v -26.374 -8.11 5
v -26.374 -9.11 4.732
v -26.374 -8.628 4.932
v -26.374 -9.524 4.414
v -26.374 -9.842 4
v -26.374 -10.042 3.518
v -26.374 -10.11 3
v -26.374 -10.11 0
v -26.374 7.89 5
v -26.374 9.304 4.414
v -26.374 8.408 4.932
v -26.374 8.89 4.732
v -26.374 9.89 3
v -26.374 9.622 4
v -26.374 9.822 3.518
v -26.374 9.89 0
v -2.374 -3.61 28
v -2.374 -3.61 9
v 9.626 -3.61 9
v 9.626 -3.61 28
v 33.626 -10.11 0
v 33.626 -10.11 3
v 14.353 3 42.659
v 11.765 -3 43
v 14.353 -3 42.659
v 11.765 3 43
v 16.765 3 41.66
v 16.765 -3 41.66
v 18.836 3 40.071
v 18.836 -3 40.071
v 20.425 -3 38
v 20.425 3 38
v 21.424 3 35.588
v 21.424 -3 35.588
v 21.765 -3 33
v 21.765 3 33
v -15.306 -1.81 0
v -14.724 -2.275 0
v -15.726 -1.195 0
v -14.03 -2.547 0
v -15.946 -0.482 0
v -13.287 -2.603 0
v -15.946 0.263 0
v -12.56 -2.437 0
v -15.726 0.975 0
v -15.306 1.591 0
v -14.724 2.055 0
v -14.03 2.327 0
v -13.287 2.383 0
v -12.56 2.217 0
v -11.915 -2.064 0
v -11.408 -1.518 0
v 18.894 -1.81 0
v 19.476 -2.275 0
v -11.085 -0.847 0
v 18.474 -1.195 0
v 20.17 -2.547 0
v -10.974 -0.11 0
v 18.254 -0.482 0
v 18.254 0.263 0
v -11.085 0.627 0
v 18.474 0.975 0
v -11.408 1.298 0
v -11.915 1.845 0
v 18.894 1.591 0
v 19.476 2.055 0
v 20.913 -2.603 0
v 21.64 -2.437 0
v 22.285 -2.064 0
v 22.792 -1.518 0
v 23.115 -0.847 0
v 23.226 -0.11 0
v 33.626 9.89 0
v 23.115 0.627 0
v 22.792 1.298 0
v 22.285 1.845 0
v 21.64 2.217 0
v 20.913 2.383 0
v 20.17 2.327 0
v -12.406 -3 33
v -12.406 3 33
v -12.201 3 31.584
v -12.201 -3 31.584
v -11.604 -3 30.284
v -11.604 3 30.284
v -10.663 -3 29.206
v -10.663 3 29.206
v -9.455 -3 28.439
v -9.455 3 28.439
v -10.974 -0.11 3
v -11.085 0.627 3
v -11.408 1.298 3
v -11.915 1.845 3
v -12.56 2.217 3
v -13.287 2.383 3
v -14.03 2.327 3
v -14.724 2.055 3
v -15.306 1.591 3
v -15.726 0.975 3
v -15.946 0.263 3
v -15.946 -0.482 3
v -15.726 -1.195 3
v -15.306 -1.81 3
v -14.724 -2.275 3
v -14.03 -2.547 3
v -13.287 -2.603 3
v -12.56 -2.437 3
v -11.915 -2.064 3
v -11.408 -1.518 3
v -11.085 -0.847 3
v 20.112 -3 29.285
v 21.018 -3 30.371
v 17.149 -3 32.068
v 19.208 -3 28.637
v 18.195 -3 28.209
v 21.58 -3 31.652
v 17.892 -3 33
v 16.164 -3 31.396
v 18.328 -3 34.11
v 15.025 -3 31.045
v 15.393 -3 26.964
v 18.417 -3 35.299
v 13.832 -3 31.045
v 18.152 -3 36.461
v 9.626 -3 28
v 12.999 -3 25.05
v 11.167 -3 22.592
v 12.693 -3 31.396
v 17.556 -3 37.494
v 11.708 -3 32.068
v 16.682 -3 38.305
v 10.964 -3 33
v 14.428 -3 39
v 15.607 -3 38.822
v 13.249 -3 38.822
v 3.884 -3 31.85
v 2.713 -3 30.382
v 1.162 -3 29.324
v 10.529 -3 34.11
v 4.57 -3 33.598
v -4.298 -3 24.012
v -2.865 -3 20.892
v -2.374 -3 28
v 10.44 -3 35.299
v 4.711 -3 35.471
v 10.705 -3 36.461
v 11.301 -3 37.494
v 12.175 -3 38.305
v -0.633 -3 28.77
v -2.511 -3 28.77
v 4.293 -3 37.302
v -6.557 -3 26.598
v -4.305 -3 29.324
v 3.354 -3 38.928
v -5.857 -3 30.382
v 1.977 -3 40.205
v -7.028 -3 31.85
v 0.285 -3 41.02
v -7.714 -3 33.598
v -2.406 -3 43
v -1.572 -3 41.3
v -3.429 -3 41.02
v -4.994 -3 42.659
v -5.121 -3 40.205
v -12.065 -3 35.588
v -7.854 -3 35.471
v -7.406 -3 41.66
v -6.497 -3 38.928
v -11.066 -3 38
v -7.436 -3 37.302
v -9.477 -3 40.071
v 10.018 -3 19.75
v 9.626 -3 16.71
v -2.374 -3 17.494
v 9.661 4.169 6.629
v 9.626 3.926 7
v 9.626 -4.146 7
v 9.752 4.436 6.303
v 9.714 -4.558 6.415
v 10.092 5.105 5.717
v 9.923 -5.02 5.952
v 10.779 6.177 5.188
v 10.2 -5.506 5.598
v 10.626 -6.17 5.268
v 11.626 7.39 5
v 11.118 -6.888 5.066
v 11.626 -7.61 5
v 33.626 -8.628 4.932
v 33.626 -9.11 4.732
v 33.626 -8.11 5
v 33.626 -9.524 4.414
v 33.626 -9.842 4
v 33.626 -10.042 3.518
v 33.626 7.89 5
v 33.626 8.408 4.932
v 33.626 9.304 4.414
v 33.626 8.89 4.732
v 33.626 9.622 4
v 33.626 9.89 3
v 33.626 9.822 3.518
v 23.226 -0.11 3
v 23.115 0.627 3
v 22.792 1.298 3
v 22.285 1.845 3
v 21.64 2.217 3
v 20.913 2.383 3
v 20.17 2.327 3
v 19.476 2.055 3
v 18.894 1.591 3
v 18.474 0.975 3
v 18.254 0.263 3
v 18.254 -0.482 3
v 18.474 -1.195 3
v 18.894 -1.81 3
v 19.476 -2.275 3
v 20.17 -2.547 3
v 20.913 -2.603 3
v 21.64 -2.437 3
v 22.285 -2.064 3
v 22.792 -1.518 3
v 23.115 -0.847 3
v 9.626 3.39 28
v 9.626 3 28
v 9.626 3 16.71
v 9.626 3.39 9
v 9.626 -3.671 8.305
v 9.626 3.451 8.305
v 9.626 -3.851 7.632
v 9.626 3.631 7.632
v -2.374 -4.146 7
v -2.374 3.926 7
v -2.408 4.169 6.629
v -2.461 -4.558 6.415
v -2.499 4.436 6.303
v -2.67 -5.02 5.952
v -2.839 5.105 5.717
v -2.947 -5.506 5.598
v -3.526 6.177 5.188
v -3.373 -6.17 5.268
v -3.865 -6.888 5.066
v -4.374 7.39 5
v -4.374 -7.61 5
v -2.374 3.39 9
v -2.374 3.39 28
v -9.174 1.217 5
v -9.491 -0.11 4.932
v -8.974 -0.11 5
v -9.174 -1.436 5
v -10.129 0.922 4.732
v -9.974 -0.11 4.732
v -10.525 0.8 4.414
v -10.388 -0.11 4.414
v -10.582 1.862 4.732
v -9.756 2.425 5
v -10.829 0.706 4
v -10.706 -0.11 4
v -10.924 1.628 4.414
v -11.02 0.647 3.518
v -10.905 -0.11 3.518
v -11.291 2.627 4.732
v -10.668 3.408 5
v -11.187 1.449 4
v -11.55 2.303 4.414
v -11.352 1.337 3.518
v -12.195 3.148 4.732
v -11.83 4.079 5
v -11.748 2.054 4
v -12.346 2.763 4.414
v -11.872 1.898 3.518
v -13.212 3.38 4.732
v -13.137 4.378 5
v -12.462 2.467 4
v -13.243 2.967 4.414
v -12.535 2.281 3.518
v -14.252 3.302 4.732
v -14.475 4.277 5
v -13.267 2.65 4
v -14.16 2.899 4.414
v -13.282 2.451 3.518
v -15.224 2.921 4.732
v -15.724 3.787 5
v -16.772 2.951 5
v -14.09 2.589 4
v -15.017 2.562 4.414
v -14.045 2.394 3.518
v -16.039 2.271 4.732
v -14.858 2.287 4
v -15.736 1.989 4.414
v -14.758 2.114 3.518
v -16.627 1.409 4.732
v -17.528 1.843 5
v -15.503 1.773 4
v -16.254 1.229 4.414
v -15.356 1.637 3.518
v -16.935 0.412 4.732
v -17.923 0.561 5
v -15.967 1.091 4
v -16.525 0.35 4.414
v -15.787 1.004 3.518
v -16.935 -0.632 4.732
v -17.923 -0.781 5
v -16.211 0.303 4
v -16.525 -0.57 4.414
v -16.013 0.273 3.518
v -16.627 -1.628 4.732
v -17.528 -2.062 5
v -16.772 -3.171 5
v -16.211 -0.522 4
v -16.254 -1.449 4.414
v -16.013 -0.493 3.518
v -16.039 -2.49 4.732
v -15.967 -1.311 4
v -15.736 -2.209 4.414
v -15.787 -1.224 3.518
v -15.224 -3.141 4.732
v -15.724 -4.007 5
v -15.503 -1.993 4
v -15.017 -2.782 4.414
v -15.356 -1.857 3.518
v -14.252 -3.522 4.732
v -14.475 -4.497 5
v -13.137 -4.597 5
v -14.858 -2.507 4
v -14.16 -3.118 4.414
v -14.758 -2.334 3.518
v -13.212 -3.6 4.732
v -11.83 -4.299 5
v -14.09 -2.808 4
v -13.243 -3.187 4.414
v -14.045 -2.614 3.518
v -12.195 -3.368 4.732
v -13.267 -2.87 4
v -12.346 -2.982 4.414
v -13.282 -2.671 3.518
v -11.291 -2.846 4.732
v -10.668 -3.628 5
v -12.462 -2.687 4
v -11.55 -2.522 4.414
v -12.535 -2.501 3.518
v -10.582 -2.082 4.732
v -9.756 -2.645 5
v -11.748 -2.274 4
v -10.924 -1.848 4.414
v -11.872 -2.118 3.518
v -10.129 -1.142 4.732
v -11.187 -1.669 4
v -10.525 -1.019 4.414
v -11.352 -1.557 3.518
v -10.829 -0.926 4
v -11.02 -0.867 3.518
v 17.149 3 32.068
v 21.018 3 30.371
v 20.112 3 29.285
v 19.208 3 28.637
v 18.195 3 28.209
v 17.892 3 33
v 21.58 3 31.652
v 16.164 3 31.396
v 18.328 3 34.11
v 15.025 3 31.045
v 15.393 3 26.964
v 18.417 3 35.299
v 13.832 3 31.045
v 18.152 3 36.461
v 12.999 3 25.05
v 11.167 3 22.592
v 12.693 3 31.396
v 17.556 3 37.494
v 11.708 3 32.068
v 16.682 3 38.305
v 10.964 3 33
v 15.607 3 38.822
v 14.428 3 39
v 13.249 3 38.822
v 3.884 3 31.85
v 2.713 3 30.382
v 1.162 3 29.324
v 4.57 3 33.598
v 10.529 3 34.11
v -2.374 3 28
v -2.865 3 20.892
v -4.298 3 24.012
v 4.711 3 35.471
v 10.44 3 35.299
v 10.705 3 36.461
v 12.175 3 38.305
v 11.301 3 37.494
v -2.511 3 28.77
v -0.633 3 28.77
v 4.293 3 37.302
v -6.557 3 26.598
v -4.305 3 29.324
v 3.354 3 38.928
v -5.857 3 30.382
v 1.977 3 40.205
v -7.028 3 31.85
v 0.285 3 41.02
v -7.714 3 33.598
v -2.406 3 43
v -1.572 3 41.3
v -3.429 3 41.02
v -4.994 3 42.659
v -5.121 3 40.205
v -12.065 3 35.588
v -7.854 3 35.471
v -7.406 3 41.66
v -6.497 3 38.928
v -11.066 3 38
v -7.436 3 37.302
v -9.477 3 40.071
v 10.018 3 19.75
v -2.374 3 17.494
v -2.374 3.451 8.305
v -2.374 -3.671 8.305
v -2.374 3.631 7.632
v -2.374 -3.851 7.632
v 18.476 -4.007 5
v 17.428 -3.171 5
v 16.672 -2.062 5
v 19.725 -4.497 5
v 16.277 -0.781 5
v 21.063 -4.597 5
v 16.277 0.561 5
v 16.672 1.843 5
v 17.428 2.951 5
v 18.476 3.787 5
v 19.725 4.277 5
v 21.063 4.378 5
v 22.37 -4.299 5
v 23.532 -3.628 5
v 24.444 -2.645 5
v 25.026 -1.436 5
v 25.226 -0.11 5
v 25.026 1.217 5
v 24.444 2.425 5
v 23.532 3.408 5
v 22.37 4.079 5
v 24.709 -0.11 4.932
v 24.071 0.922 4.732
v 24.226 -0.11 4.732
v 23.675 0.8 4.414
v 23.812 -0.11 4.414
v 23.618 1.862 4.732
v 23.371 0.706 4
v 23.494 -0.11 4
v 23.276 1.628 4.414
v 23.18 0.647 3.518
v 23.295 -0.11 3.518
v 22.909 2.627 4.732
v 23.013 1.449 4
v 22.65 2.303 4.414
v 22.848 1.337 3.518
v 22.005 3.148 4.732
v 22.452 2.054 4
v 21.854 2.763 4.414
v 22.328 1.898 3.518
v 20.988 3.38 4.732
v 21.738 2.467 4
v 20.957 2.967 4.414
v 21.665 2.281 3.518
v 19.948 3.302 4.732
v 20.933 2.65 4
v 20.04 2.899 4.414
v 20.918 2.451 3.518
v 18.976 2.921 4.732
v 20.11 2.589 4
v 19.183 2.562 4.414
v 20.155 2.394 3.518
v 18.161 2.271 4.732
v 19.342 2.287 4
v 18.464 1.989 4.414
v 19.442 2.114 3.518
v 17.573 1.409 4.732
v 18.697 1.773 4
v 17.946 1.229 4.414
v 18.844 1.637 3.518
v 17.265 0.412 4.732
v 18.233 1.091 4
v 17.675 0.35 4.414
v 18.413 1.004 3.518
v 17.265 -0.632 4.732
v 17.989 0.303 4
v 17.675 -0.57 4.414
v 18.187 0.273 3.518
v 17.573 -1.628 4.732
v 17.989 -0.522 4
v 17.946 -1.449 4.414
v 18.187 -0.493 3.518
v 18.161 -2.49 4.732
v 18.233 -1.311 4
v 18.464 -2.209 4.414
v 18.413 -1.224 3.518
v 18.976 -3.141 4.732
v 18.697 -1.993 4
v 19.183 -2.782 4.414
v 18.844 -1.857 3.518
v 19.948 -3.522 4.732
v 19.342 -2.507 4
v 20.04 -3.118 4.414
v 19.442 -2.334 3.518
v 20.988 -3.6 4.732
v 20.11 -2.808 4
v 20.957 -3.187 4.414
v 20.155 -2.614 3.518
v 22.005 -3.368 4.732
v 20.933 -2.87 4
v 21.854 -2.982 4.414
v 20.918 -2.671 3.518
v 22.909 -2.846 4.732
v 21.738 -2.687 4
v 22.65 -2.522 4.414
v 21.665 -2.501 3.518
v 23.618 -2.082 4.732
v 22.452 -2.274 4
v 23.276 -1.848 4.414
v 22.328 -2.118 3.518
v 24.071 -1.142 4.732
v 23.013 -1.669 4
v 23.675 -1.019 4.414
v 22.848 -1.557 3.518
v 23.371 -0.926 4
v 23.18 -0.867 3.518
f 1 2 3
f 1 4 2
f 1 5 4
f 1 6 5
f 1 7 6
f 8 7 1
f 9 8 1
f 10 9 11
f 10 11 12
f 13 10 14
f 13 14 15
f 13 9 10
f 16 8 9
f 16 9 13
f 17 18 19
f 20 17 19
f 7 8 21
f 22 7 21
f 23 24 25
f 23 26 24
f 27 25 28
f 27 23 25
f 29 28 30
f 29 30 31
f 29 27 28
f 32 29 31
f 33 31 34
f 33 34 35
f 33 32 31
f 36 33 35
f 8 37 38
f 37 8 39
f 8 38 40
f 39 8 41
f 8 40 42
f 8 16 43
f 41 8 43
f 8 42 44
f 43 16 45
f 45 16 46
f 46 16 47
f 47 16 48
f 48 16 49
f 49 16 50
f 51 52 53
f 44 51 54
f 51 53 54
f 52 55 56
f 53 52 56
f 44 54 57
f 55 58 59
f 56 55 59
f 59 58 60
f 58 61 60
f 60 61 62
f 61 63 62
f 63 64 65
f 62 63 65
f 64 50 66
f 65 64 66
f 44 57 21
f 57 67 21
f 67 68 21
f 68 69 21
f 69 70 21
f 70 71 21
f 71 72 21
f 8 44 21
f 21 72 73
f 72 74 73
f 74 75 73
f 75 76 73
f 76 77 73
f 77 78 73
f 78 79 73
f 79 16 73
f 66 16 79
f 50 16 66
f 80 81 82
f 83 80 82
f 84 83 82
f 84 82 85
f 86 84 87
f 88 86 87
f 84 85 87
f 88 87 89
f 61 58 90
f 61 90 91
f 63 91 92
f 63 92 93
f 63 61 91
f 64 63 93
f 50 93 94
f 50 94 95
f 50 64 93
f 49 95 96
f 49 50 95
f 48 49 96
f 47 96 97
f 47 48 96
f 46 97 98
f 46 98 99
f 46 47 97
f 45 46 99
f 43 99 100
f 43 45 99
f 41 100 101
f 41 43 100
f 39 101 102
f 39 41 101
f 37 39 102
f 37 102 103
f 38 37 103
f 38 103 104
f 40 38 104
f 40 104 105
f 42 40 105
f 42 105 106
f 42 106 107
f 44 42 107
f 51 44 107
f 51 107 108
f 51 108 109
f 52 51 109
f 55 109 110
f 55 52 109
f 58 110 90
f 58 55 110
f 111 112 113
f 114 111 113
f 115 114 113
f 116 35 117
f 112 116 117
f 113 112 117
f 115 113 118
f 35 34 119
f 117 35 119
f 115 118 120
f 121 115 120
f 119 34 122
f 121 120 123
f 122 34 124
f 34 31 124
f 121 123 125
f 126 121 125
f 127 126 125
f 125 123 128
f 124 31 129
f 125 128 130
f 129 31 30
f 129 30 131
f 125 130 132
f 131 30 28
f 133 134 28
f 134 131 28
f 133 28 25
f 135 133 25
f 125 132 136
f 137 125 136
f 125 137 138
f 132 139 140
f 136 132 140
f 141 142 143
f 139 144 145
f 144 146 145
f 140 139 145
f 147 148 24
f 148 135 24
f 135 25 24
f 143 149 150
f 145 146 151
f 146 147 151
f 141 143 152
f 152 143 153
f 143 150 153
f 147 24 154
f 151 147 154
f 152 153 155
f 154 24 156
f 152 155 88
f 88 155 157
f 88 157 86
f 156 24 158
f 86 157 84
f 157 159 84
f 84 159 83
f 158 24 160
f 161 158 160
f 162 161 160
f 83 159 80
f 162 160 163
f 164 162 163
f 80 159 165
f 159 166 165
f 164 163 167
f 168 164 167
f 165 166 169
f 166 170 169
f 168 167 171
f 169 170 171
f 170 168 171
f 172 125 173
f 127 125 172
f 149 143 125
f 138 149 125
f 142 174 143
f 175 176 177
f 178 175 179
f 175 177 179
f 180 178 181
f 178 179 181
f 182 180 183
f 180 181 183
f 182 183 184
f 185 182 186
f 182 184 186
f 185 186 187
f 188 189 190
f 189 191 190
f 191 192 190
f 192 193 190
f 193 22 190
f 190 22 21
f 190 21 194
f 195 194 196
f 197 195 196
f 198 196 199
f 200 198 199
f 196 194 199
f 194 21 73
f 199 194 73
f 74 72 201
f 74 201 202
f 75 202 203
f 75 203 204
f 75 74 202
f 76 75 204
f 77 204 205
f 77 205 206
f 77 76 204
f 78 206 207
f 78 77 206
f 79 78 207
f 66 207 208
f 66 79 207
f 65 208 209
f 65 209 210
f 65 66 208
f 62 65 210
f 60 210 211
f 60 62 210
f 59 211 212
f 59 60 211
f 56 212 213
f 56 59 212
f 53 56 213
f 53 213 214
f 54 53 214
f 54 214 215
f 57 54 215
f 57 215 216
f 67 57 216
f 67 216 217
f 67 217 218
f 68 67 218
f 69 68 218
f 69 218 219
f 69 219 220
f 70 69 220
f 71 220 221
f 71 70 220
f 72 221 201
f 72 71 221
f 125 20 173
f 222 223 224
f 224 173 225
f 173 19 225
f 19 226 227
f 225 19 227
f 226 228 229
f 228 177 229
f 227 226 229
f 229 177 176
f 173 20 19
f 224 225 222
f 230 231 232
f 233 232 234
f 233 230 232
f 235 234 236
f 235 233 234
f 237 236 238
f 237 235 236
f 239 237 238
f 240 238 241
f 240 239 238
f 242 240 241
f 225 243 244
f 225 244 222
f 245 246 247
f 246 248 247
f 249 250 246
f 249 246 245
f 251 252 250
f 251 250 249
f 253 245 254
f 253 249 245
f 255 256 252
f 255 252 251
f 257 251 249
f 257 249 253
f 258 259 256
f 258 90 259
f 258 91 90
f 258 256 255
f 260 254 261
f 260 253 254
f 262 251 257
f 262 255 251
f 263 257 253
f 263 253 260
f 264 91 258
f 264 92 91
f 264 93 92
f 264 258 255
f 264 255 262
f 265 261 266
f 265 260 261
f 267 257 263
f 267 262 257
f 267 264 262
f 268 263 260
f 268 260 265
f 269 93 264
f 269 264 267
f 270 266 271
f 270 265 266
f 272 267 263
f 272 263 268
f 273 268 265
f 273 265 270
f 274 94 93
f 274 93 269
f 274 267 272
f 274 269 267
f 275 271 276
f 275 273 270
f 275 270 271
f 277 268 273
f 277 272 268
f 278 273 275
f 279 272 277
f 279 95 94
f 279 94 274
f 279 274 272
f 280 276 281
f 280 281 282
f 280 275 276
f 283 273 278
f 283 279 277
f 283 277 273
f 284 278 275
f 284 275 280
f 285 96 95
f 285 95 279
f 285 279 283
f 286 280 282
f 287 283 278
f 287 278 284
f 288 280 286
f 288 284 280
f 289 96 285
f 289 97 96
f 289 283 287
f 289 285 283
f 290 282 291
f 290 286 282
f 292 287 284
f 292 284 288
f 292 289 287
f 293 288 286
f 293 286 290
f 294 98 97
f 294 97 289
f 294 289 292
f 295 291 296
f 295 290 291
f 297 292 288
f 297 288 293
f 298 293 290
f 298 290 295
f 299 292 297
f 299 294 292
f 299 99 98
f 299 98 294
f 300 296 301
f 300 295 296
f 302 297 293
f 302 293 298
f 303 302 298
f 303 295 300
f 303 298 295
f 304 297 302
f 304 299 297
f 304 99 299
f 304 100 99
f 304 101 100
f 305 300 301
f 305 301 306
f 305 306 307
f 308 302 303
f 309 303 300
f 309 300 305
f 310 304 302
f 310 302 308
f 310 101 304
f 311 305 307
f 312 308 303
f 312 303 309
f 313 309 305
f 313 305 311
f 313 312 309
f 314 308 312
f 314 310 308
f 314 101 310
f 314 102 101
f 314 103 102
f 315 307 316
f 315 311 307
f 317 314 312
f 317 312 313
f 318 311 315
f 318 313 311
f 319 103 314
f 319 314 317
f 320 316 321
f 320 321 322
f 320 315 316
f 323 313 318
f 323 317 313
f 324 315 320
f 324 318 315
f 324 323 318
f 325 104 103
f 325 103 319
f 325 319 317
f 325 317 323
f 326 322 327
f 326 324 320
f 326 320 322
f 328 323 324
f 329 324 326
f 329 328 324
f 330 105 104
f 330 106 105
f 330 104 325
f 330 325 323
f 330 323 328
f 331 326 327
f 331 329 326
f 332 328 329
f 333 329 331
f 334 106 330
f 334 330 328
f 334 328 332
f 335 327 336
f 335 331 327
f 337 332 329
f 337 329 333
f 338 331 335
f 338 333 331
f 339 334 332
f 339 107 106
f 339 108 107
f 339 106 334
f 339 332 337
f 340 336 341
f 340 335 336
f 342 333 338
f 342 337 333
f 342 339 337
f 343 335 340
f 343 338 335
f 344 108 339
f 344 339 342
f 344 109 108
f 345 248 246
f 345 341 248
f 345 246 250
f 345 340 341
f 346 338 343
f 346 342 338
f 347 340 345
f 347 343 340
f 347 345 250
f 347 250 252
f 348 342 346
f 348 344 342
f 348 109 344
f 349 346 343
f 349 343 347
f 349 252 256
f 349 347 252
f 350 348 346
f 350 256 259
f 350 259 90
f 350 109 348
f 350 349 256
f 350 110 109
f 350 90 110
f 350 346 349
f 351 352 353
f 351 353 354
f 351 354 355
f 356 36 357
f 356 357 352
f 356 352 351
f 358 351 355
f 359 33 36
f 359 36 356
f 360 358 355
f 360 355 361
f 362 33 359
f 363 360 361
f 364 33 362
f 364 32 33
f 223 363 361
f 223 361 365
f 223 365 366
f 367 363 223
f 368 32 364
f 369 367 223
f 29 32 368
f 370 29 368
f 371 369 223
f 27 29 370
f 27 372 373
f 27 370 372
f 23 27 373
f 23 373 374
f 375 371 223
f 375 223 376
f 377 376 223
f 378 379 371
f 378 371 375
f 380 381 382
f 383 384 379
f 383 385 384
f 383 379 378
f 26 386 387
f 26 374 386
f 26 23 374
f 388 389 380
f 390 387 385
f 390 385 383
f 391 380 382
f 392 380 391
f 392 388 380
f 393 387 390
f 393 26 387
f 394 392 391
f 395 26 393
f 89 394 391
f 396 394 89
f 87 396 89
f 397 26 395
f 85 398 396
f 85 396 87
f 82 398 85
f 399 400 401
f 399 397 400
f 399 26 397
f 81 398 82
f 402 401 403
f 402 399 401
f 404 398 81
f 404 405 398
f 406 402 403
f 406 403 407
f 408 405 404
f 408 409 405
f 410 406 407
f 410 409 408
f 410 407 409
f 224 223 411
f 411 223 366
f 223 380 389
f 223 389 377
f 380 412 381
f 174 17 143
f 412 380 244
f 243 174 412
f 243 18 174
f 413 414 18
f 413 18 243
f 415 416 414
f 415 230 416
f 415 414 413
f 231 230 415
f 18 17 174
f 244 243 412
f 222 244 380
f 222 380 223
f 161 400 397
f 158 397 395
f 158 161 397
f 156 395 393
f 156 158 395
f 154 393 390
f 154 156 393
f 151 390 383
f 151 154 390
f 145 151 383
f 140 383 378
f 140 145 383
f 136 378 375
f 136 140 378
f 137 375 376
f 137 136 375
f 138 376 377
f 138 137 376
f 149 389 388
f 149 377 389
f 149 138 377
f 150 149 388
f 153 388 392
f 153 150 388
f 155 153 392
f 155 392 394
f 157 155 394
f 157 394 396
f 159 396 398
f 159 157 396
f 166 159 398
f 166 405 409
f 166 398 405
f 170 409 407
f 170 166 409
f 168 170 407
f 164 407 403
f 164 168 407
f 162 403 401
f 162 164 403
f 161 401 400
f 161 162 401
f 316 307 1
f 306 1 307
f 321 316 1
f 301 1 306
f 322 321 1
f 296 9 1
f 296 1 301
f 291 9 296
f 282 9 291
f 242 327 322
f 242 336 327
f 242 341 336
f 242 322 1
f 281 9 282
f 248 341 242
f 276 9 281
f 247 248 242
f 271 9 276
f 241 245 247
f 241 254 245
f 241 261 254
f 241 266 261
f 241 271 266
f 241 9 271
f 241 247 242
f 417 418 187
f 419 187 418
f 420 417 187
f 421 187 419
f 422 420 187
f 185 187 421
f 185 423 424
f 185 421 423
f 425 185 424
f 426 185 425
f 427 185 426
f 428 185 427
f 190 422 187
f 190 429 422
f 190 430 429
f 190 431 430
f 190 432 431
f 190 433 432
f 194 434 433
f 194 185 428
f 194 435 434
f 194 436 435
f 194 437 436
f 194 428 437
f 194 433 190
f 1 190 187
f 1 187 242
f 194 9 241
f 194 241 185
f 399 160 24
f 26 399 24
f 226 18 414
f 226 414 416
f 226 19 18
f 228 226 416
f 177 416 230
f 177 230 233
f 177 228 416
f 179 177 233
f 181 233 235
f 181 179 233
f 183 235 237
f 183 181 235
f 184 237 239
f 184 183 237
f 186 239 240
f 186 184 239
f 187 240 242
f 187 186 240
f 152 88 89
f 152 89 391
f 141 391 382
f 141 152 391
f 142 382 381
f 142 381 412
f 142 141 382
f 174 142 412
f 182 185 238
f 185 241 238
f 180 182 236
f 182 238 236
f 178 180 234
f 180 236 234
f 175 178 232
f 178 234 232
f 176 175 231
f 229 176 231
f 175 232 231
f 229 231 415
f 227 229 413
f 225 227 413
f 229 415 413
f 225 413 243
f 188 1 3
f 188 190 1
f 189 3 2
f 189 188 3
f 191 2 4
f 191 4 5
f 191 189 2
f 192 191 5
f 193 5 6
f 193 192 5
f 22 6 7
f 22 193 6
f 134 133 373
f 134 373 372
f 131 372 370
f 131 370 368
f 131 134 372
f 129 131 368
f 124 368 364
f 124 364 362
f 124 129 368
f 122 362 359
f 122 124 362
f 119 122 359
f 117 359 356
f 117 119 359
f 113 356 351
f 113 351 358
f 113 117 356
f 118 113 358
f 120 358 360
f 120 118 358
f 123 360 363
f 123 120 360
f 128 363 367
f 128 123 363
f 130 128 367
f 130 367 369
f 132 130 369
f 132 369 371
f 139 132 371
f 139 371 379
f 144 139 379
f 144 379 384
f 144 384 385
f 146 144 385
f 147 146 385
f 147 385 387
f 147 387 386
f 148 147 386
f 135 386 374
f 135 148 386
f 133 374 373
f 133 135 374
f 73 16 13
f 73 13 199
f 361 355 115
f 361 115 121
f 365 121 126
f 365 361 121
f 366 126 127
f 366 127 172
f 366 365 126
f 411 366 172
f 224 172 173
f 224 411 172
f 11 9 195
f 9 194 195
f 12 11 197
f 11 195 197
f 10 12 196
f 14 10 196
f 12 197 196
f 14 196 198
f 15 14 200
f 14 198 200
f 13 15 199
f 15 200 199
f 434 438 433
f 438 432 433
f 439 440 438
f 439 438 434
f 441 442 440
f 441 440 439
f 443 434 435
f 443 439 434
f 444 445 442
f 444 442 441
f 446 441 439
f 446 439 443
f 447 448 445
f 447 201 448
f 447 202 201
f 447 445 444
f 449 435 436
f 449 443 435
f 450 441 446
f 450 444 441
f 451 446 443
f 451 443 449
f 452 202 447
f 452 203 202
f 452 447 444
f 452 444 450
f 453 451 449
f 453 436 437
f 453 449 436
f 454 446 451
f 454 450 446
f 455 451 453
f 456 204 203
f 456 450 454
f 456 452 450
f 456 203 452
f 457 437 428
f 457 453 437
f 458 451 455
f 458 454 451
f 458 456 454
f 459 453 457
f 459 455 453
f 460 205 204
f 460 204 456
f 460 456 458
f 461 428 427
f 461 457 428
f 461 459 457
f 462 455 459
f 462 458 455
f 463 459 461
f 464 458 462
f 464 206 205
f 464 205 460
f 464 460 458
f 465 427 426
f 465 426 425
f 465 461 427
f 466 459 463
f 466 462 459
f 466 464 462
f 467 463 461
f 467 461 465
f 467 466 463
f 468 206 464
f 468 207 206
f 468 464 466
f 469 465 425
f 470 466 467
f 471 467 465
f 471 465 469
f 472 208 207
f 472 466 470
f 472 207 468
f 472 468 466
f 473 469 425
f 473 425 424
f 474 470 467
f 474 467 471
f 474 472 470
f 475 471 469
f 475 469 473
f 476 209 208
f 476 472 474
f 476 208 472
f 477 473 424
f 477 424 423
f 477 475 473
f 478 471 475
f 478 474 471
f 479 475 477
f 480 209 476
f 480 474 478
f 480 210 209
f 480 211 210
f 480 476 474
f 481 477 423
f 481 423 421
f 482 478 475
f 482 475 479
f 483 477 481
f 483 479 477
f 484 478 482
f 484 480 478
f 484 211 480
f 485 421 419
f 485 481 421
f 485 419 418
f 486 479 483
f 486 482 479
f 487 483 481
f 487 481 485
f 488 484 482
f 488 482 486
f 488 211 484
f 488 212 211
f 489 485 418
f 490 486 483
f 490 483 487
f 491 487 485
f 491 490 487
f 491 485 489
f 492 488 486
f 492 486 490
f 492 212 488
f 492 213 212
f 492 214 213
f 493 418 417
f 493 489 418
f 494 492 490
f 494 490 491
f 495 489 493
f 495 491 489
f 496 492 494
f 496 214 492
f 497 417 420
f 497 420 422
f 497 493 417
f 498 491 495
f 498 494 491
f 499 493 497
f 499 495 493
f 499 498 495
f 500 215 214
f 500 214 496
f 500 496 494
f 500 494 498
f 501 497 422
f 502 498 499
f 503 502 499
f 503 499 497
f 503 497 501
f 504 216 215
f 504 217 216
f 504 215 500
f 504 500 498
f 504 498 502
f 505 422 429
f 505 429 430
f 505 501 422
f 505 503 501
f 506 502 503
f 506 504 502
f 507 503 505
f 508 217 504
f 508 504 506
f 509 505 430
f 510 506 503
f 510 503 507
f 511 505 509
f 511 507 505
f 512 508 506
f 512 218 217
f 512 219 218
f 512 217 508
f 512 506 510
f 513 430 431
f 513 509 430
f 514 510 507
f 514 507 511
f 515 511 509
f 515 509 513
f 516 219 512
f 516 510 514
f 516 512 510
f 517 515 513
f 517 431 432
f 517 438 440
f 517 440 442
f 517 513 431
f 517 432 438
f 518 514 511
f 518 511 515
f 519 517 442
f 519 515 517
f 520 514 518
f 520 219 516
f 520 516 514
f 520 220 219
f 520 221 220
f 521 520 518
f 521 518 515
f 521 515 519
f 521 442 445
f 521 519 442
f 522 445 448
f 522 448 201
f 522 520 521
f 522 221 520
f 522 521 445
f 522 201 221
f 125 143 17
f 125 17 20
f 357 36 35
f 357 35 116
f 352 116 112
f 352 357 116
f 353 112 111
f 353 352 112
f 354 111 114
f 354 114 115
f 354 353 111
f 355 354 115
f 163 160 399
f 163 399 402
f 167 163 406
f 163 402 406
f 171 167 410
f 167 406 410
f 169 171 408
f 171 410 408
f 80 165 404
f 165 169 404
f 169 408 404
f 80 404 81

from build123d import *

# Parameters (mm, degrees)
ESBO_O1_W                     = 60
ESBO_O1_H                     = 20
ESBO_O1_R                     = 2.5
RESSALTO_EXTRUS_O2_DEPTH      = 5
ESBO_O2_W                     = 12
ESBO_O2_H                     = 7
RESSALTO_EXTRUS_O3_DEPTH      = 28
RESSALTO_EXTRUS_O4_DEPTH      = 3
RESSALTO_EXTRUS_O4_DEPTH_BACK = 3
ESBO_O3_R                     = 4
ESBO_O3_R_2                   = 6.3
FILETE1_R                     = 10
FILETE2_R                     = 10
FILETE5_R                     = 5
FILETE7_R                     = 5
FILETE9_R                     = 2
FILETE10_R                    = 2
FILETE13_R                    = 12
FILETE14_R                    = 12
FILETE15_R                    = 4
FILETE16_R                    = 4
FILETE17_R                    = 2
FILETE18_R                    = 2
FILETE19_R                    = 2
FILETE20_R                    = 2


with BuildPart() as part:
    # Esboço1 → Ressalto-extrusão2 (new body)
    with BuildSketch(Plane.XY):
        with Locations((3.626373626, -0.10989011)):
            Rectangle(ESBO_O1_W, ESBO_O1_H)
        with Locations((-13.473626374, -0.10989011)):
            Circle(ESBO_O1_R, mode=Mode.SUBTRACT)
        with Locations((20.726373626, -0.10989011)):
            Circle(ESBO_O1_R, mode=Mode.SUBTRACT)
    extrude(amount=RESSALTO_EXTRUS_O2_DEPTH)

    # Esboço2 → Ressalto-extrusão3 (add)
    with BuildSketch(Plane.XY):
        with Locations((3.626373626, -0.10989011)):
            Rectangle(ESBO_O2_W, ESBO_O2_H)
    extrude(amount=RESSALTO_EXTRUS_O3_DEPTH)

    # Esboço3 → Ressalto-extrusão4 (add, two sides: drawn at the far end of the back side and taken through both)
    with BuildSketch(Plane(origin=(0, 0, 0), x_dir=(1, 0, 0), z_dir=(0, 1, 0)).offset(-RESSALTO_EXTRUS_O4_DEPTH_BACK)):
        Polygon((-21.373626374, -43), (28.626373626, -43), (20.428395134, -28), (-11.066061454, -28), align=None)
        with Locations(Location((14.428395134, -35, 0), (0, 0, 270))):
            Circle(ESBO_O3_R, mode=Mode.SUBTRACT)
        with Locations(Location((-1.571604866, -35, 0), (0, 0, 270))):
            Circle(ESBO_O3_R_2, mode=Mode.SUBTRACT)
    extrude(amount=RESSALTO_EXTRUS_O4_DEPTH + RESSALTO_EXTRUS_O4_DEPTH_BACK)

    # Filete1
    # the kernel refuses this fillet: 10 mm, written as the material it takes off along each edge
    with BuildSketch(Plane(origin=(-21.373626374, 50.419547395, 43), x_dir=(0.5663446817088761, 0, -0.8241684909653315), z_dir=(0, -1, 0))) as filete1_piece_1:
        with BuildLine():
            CenterArc((18.9840083, 9.96923191), FILETE1_R, 145.504279398, 120)
            Line((10.74232339, 15.632678727), (10.577489692, 15.745947664))
            Line((10.577489692, 15.745947664), (-0.164833698, 0.113268936))
            Line((-0.164833698, 0.113268936), (0, -0.2))
            ThreePointArc((0, -0.2), (9.100080969, -0.2), (18.184485011, -0.199384638))
            Line((18.184485011, -0.199384638), (18.200161938, 0))
        make_face()
    extrude(amount=100.839094789, mode=Mode.SUBTRACT)

    # Filete2
    filete2_edges = [part.edges().sort_by_distance(p)[0] for p in [
        (28.626373626, 0, 43),
    ]]
    fillet(filete2_edges, radius=FILETE2_R)

    # Filete5
    filete5_edges = [part.edges().sort_by_distance(p)[0] for p in [
        (20.428395134, 0, 28),
    ]]
    fillet(filete5_edges, radius=FILETE5_R)

    # Filete7
    filete7_edges = [part.edges().sort_by_distance(p)[0] for p in [
        (-11.066061454, 0, 28),
    ]]
    fillet(filete7_edges, radius=FILETE7_R)

    # Filete9
    filete9_edges = [part.edges().sort_by_distance(p)[0] for p in [
        (9.626373626, -0.10989011, 5),
    ]]
    fillet(filete9_edges, radius=FILETE9_R)

    # Filete10
    filete10_edges = [part.edges().sort_by_distance(p)[0] for p in [
        (-2.373626374, -0.10989011, 5),
    ]]
    fillet(filete10_edges, radius=FILETE10_R)

    # Filete13
    # the kernel refuses this fillet: 12 mm, written as the material it adds along each edge
    with BuildSketch(Plane(origin=(-2.373626374, -3, 28), x_dir=(0, 0, -1), z_dir=(0, 1, 0))) as filete13_piece_1_section:
        with BuildLine():
            CenterArc((10.506434115, 12), FILETE13_R, 204.196775666, 65.803224334)
            Line((-0.439284084, 7.081539559), (-1.533855904, 6.589693515))
            ThreePointArc((-1.533855904, 6.589693515), (-1.2, 5.032181042), (-1.2, 0))
            Line((-1.2, 0), (0, -1.2))
            Line((0, -1.2), (10.506434115, -1.2))
            Line((10.506434115, -1.2), (10.506434115, 0))
        make_face()
    filete13_piece_1 = extrude(amount=6, mode=Mode.PRIVATE)
    filete13_piece_1 = filete13_piece_1 - Plane(origin=(-1.571604866, 0, 35), x_dir=(0, 0, 1), z_dir=(0, -1, 0)) * Cylinder(6.3, 55, mode=Mode.PRIVATE)
    add(filete13_piece_1)

    # Filete14
    # the kernel refuses this fillet: 12 mm, written as the material it adds along each edge
    with BuildSketch(Plane(origin=(9.626373626, 3, 28), x_dir=(0.9997032338035666, 0, 0.02436071268849559), z_dir=(0, -1, 0))) as filete14_piece_1:
        with BuildLine():
            CenterArc((11.721404045, -11.579073047), FILETE14_R, 105.220471519, 73.38362437)
            Line((-0.275034761, -11.286744494), (-1.474678641, -11.257511639))
            Line((-1.474678641, -11.257511639), (-1.199643881, 0.029232855))
            Line((-1.199643881, 0.029232855), (0.029232855, 1.199643881))
            ThreePointArc((0.029232855, 1.199643881), (7.165756053, 1.025741481), (8.255955801, 1.157907305))
            Line((8.255955801, 1.157907305), (8.570996551, 0))
        make_face()
    extrude(amount=6)

    # Filete15
    filete15_edges = [part.edges().sort_by_distance(p)[0] for p in [
        (3.626373626, 3.39010989, 5),
    ]]
    fillet(filete15_edges, radius=FILETE15_R)

    # Filete16
    filete16_edges = [part.edges().sort_by_distance(p)[0] for p in [
        (3.626373626, -3.60989011, 5),
    ]]
    fillet(filete16_edges, radius=FILETE16_R)

    # Filete17
    filete17_edges = [part.edges().sort_by_distance(p)[0] for p in [
        (18.226373626, -0.10989011, 5),
    ]]
    fillet(filete17_edges, radius=FILETE17_R)

    # Filete18
    filete18_edges = [part.edges().sort_by_distance(p)[0] for p in [
        (-15.973626374, -0.10989011, 5),
    ]]
    fillet(filete18_edges, radius=FILETE18_R)

    # Filete19
    filete19_edges = [part.edges().sort_by_distance(p)[0] for p in [
        (3.626373626, 9.89010989, 5),
    ]]
    fillet(filete19_edges, radius=FILETE19_R)

    # Filete20
    filete20_edges = [part.edges().sort_by_distance(p)[0] for p in [
        (3.626373626, -10.10989011, 5),
    ]]
    fillet(filete20_edges, radius=FILETE20_R)


solid = part.part
